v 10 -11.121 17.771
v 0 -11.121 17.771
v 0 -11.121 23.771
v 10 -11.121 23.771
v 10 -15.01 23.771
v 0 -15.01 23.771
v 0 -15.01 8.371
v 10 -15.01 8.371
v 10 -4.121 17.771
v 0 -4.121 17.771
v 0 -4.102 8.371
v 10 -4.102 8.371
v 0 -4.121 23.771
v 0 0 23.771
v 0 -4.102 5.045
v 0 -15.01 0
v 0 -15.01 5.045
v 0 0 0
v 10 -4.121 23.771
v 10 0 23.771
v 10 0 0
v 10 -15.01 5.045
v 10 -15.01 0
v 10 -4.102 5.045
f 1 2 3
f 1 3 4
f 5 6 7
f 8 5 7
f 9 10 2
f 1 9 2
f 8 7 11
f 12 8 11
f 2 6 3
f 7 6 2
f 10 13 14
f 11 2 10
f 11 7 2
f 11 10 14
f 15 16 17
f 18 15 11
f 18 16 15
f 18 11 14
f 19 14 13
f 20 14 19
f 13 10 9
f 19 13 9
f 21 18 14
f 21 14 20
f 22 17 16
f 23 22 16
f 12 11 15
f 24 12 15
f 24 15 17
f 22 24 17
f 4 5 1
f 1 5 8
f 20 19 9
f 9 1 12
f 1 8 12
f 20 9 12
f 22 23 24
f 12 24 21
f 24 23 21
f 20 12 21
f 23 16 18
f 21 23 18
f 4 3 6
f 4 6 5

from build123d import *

# Parameters (mm, degrees)
F1_DEPTH = 10
F2_W     = 10
F2_H     = 4.121232
F2_H_2   = 3.88832
F3_DEPTH = 6


with BuildPart() as f1:
    # F0 (on Right) → F1 (new body)
    with BuildSketch(Plane.YZ):
        Polygon((-15.009552, 0), (0, 0), (0, 17.770922), (-15.009552, 17.770922), (-15.009552, 8.370922), (-4.10229, 8.370922), (-4.10229, 5.044594), (-15.009552, 5.044594), align=None)
    extrude(amount=F1_DEPTH)

    # F2 (on face) → F3 (join)
    with BuildSketch(Plane.XY.offset(17.770922)):
        with Locations((5, -2.060616)):
            Rectangle(F2_W, F2_H)
        with Locations((5, -13.065392)):
            Rectangle(F2_W, F2_H_2)
    extrude(amount=F3_DEPTH)


solid = f1.part
